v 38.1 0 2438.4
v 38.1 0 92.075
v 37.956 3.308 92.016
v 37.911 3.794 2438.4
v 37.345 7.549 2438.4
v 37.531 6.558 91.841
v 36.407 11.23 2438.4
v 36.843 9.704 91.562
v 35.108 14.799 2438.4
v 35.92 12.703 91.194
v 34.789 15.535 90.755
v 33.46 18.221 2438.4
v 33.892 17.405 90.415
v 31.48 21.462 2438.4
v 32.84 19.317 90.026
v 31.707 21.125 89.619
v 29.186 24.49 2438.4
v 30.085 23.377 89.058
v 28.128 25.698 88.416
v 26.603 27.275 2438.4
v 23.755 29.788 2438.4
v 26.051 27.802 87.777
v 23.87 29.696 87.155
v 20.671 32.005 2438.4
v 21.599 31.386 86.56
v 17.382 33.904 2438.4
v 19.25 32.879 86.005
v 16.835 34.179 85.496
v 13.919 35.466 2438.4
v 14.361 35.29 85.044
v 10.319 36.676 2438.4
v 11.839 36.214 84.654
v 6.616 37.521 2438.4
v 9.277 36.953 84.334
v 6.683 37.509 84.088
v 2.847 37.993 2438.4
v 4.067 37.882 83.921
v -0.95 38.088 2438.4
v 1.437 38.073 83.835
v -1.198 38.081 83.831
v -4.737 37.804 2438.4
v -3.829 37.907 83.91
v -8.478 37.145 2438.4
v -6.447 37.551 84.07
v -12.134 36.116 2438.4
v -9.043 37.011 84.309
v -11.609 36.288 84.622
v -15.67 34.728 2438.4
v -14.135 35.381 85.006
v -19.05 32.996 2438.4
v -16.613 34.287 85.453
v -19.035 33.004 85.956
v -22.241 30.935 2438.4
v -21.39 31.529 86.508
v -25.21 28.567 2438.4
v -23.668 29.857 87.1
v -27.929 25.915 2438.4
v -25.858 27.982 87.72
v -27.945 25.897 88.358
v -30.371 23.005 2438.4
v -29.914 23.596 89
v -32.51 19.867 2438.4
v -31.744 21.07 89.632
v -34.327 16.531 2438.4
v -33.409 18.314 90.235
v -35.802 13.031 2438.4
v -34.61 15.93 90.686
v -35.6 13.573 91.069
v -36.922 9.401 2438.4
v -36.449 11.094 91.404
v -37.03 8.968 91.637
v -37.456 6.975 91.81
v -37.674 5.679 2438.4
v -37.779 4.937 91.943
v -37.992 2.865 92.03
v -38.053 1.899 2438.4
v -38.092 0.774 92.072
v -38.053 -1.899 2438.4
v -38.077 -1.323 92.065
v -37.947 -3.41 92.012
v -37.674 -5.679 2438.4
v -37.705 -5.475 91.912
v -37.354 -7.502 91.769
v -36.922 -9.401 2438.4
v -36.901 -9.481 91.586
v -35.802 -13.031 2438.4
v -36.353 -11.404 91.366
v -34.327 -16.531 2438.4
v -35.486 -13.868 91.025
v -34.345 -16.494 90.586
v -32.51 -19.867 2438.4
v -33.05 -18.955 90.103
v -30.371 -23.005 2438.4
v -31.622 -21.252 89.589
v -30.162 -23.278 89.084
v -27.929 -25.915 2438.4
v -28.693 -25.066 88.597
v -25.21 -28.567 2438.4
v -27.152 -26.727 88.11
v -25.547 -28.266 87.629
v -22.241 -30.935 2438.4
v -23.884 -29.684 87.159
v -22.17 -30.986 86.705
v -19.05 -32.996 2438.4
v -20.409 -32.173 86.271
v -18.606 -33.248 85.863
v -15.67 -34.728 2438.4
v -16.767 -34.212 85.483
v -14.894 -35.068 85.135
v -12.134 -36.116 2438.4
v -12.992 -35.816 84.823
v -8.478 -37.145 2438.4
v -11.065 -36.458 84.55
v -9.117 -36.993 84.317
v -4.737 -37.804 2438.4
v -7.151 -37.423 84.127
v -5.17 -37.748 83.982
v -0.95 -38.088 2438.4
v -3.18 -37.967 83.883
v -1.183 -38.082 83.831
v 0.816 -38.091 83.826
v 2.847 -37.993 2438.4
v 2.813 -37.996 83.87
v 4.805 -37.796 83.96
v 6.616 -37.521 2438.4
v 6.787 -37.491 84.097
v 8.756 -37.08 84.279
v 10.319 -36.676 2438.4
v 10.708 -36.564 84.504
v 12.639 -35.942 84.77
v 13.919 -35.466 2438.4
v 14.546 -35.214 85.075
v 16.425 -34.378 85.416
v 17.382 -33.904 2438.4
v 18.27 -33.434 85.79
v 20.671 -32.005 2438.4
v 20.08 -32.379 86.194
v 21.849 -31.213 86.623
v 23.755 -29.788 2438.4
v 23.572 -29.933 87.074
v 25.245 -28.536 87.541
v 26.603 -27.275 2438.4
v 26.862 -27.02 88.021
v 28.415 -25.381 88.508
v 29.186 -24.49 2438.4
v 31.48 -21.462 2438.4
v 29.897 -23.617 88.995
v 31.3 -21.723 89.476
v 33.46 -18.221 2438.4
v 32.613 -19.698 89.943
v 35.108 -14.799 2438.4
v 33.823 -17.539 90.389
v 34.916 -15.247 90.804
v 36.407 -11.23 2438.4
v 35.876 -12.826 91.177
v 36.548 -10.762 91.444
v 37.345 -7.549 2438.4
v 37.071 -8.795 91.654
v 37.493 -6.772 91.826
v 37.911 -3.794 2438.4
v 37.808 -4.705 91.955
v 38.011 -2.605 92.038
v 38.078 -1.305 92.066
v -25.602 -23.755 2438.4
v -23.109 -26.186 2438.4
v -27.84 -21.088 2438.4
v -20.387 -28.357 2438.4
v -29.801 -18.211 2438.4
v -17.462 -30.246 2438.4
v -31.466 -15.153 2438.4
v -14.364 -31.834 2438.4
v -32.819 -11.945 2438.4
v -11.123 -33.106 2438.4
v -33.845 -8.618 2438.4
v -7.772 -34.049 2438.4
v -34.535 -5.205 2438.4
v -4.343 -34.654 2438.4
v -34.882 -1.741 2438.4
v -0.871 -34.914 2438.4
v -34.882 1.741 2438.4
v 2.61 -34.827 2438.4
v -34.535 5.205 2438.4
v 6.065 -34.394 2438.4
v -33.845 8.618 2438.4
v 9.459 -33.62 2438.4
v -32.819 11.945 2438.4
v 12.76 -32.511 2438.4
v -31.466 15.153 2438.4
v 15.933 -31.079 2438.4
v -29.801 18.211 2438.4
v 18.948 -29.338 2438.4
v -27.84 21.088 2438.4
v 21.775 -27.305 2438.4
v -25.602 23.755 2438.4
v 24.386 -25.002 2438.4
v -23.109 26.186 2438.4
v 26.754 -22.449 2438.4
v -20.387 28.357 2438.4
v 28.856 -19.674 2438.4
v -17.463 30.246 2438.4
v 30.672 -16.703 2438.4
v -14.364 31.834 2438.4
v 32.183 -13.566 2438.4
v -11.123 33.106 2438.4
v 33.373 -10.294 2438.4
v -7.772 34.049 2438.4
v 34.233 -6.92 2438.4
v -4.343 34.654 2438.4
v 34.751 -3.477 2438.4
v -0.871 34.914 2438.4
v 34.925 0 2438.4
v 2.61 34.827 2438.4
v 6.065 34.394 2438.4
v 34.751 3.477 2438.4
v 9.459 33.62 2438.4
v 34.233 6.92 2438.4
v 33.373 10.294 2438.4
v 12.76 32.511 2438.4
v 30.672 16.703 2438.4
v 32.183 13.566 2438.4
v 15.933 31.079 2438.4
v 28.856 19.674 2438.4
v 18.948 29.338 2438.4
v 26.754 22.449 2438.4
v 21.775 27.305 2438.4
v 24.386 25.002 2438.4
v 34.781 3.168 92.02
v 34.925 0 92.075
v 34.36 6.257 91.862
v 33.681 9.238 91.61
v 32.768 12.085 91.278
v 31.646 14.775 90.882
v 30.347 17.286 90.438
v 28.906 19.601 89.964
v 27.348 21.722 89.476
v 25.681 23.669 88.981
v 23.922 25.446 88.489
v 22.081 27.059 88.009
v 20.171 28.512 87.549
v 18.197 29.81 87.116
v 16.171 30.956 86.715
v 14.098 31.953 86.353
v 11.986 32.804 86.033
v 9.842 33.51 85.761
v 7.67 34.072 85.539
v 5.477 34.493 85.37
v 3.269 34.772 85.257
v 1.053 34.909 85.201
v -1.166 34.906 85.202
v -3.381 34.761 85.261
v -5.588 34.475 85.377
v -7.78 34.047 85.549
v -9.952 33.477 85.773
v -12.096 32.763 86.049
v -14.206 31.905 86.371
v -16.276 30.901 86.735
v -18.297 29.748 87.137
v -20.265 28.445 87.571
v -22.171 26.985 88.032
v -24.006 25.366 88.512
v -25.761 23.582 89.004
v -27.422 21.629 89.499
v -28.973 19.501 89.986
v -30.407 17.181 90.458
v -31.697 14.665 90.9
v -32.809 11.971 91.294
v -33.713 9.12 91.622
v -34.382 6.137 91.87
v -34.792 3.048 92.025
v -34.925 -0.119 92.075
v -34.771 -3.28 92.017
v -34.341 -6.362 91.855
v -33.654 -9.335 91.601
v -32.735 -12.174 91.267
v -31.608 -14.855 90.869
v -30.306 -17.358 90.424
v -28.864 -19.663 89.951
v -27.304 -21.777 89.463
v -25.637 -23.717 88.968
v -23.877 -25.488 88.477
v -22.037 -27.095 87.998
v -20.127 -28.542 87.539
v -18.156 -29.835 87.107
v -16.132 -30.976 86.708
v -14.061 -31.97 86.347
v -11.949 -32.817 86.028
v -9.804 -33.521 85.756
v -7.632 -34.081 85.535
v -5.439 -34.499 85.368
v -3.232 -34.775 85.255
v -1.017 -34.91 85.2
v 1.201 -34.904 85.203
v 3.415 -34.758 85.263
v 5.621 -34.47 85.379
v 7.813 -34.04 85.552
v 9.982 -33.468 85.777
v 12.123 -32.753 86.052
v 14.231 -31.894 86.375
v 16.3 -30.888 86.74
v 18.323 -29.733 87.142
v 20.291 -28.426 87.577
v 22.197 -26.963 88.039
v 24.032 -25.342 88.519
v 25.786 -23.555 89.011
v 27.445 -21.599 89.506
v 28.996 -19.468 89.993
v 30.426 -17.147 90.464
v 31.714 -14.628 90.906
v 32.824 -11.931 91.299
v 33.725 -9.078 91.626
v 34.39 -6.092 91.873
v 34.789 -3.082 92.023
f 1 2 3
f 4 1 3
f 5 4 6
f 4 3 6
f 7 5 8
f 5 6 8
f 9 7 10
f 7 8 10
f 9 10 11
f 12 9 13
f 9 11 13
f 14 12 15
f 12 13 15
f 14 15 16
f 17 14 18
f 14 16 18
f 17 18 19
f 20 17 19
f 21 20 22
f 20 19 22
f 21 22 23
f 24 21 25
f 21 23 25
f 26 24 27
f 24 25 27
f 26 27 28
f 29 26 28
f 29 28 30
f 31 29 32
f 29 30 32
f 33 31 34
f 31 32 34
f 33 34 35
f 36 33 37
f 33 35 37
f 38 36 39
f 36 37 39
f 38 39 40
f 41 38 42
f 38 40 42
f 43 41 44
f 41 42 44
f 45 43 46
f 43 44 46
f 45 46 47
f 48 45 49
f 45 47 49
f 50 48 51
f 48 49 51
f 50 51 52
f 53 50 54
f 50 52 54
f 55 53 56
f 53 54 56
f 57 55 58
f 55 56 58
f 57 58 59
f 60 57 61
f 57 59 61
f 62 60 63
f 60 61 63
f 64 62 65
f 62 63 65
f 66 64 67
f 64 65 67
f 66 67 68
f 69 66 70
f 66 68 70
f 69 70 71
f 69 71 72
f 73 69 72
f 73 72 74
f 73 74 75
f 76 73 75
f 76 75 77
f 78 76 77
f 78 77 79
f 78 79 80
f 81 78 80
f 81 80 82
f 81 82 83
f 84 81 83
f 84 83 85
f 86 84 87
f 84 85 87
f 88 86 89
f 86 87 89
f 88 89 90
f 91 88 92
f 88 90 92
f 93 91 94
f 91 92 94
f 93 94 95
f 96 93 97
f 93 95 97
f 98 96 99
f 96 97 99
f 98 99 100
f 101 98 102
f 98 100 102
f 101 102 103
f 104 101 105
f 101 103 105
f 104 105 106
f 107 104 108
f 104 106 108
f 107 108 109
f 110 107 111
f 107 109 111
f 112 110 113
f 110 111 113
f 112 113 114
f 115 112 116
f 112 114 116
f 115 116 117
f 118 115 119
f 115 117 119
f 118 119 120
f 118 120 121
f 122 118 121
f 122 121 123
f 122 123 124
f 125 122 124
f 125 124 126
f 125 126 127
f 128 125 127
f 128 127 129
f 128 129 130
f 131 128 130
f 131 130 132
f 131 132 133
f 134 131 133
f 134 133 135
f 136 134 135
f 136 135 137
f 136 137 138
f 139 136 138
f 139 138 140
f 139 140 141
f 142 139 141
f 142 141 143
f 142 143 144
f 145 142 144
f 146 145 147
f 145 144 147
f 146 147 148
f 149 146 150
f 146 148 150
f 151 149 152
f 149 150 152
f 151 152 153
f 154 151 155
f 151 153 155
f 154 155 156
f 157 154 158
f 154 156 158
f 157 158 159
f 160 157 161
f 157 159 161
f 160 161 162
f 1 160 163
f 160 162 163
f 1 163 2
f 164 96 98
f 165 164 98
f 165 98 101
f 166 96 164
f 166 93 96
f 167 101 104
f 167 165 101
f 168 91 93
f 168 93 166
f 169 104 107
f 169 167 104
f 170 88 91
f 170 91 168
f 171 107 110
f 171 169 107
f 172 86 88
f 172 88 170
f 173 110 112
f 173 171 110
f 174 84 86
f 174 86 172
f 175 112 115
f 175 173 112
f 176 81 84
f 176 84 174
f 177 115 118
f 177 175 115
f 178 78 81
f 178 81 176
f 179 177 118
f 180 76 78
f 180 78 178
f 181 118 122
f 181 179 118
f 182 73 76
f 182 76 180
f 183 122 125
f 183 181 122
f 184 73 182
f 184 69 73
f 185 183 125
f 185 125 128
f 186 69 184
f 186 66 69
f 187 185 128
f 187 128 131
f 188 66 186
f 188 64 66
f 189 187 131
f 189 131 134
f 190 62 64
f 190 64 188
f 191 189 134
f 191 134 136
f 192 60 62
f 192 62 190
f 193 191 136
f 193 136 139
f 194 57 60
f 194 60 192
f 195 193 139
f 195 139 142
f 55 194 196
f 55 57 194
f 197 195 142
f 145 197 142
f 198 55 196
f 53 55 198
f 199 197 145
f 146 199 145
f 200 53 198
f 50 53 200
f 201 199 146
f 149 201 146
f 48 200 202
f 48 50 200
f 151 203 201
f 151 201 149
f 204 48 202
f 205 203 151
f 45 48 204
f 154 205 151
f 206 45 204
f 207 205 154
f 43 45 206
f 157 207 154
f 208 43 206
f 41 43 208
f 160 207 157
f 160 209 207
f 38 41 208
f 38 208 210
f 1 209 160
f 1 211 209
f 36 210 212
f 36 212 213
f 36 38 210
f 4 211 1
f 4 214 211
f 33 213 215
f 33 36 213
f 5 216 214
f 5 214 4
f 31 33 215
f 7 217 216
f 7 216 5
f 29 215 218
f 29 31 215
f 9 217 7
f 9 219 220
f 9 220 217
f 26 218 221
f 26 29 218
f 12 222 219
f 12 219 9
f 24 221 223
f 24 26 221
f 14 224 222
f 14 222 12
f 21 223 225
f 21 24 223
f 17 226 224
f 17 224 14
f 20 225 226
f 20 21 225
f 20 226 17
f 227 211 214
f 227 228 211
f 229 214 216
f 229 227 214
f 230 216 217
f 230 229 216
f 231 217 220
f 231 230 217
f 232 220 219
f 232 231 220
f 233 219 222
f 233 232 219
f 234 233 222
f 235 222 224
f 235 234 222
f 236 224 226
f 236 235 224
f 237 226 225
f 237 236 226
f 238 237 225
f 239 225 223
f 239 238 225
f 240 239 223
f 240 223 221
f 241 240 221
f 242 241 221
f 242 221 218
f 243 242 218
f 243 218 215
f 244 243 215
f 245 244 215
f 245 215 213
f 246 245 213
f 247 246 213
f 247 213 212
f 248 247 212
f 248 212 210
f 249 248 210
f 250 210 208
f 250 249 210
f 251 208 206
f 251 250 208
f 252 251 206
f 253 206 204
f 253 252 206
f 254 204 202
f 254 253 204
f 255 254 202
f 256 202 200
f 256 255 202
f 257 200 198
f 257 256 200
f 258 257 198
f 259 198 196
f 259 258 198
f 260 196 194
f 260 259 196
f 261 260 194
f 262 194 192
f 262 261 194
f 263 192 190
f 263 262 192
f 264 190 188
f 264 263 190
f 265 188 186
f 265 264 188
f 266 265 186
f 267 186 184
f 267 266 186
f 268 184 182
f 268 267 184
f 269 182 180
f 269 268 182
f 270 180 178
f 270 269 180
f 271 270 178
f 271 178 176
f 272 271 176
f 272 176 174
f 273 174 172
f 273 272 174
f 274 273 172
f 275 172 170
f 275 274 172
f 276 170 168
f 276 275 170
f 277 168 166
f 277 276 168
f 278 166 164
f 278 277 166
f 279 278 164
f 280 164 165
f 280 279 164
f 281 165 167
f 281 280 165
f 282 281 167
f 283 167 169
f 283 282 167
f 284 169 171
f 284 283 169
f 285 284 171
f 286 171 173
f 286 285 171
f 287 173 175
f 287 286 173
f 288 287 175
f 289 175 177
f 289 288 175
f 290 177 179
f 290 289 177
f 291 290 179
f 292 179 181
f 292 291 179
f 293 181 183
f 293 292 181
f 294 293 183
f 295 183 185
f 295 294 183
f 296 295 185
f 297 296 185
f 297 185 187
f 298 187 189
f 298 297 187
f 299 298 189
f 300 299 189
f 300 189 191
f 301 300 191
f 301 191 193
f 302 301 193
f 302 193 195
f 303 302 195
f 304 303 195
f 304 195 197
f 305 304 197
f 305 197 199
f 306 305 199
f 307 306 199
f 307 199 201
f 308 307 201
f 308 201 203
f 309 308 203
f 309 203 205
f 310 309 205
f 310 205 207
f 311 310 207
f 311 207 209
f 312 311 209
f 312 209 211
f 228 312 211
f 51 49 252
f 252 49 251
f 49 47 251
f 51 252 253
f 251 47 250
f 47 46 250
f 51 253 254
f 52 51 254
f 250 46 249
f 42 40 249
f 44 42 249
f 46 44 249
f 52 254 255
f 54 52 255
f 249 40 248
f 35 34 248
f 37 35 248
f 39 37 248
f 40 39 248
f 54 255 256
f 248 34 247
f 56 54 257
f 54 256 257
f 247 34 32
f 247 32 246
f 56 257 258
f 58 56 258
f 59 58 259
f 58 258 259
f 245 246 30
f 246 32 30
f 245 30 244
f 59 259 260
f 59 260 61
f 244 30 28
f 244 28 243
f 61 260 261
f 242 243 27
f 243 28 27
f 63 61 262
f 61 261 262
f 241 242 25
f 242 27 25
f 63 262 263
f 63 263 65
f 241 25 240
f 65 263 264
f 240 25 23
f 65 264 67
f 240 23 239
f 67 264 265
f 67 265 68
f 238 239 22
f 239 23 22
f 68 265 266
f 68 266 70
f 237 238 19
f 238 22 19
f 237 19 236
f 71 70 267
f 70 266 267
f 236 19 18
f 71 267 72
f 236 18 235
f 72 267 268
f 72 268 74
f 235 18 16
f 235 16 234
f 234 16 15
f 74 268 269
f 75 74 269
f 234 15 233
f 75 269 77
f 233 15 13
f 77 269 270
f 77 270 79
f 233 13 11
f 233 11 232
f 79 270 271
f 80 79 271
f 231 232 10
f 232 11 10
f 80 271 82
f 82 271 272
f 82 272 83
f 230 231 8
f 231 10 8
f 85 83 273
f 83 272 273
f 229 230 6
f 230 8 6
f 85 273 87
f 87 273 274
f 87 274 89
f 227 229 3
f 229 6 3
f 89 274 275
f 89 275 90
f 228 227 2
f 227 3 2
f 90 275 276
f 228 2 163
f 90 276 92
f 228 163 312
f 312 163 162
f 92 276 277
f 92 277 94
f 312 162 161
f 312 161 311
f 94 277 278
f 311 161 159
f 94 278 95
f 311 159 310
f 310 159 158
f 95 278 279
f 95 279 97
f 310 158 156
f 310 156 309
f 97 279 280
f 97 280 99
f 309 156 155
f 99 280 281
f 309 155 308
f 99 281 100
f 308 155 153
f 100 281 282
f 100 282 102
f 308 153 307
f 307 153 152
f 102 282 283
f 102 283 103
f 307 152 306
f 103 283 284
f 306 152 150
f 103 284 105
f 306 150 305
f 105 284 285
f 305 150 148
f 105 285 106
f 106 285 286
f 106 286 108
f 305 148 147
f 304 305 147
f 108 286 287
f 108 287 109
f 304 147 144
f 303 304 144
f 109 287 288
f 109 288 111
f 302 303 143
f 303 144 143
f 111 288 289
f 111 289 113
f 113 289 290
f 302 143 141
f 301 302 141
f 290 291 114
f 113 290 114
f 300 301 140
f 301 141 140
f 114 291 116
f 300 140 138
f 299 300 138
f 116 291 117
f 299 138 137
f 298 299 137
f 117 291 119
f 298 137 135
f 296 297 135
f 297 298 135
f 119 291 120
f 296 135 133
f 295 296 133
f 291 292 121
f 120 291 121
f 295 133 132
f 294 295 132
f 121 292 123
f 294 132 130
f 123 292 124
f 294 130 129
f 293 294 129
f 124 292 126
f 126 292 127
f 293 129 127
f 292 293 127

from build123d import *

# Parameters (mm, degrees)
F0_R     = 38.1
F1_DEPTH = 2438.4
F2_R     = 34.925
F3_DEPTH = 2438.401
F4_R     = 92.075
F5_DEPTH = 76.2


with BuildPart() as f1:
    # F0 (on Top) → F1 (new body)
    with BuildSketch(Plane.XY):
        Circle(F0_R)
    extrude(amount=F1_DEPTH)

    # F2 (on Top) → F3 (cut, through all)
    with BuildSketch(Plane.XY):
        Circle(F2_R)
    extrude(amount=F3_DEPTH, mode=Mode.SUBTRACT)

    # F4 (on Right) → F5 (cut, symmetric)
    with BuildSketch(Plane.YZ):
        Circle(F4_R)
    extrude(amount=F5_DEPTH, both=True, mode=Mode.SUBTRACT)


solid = f1.part
